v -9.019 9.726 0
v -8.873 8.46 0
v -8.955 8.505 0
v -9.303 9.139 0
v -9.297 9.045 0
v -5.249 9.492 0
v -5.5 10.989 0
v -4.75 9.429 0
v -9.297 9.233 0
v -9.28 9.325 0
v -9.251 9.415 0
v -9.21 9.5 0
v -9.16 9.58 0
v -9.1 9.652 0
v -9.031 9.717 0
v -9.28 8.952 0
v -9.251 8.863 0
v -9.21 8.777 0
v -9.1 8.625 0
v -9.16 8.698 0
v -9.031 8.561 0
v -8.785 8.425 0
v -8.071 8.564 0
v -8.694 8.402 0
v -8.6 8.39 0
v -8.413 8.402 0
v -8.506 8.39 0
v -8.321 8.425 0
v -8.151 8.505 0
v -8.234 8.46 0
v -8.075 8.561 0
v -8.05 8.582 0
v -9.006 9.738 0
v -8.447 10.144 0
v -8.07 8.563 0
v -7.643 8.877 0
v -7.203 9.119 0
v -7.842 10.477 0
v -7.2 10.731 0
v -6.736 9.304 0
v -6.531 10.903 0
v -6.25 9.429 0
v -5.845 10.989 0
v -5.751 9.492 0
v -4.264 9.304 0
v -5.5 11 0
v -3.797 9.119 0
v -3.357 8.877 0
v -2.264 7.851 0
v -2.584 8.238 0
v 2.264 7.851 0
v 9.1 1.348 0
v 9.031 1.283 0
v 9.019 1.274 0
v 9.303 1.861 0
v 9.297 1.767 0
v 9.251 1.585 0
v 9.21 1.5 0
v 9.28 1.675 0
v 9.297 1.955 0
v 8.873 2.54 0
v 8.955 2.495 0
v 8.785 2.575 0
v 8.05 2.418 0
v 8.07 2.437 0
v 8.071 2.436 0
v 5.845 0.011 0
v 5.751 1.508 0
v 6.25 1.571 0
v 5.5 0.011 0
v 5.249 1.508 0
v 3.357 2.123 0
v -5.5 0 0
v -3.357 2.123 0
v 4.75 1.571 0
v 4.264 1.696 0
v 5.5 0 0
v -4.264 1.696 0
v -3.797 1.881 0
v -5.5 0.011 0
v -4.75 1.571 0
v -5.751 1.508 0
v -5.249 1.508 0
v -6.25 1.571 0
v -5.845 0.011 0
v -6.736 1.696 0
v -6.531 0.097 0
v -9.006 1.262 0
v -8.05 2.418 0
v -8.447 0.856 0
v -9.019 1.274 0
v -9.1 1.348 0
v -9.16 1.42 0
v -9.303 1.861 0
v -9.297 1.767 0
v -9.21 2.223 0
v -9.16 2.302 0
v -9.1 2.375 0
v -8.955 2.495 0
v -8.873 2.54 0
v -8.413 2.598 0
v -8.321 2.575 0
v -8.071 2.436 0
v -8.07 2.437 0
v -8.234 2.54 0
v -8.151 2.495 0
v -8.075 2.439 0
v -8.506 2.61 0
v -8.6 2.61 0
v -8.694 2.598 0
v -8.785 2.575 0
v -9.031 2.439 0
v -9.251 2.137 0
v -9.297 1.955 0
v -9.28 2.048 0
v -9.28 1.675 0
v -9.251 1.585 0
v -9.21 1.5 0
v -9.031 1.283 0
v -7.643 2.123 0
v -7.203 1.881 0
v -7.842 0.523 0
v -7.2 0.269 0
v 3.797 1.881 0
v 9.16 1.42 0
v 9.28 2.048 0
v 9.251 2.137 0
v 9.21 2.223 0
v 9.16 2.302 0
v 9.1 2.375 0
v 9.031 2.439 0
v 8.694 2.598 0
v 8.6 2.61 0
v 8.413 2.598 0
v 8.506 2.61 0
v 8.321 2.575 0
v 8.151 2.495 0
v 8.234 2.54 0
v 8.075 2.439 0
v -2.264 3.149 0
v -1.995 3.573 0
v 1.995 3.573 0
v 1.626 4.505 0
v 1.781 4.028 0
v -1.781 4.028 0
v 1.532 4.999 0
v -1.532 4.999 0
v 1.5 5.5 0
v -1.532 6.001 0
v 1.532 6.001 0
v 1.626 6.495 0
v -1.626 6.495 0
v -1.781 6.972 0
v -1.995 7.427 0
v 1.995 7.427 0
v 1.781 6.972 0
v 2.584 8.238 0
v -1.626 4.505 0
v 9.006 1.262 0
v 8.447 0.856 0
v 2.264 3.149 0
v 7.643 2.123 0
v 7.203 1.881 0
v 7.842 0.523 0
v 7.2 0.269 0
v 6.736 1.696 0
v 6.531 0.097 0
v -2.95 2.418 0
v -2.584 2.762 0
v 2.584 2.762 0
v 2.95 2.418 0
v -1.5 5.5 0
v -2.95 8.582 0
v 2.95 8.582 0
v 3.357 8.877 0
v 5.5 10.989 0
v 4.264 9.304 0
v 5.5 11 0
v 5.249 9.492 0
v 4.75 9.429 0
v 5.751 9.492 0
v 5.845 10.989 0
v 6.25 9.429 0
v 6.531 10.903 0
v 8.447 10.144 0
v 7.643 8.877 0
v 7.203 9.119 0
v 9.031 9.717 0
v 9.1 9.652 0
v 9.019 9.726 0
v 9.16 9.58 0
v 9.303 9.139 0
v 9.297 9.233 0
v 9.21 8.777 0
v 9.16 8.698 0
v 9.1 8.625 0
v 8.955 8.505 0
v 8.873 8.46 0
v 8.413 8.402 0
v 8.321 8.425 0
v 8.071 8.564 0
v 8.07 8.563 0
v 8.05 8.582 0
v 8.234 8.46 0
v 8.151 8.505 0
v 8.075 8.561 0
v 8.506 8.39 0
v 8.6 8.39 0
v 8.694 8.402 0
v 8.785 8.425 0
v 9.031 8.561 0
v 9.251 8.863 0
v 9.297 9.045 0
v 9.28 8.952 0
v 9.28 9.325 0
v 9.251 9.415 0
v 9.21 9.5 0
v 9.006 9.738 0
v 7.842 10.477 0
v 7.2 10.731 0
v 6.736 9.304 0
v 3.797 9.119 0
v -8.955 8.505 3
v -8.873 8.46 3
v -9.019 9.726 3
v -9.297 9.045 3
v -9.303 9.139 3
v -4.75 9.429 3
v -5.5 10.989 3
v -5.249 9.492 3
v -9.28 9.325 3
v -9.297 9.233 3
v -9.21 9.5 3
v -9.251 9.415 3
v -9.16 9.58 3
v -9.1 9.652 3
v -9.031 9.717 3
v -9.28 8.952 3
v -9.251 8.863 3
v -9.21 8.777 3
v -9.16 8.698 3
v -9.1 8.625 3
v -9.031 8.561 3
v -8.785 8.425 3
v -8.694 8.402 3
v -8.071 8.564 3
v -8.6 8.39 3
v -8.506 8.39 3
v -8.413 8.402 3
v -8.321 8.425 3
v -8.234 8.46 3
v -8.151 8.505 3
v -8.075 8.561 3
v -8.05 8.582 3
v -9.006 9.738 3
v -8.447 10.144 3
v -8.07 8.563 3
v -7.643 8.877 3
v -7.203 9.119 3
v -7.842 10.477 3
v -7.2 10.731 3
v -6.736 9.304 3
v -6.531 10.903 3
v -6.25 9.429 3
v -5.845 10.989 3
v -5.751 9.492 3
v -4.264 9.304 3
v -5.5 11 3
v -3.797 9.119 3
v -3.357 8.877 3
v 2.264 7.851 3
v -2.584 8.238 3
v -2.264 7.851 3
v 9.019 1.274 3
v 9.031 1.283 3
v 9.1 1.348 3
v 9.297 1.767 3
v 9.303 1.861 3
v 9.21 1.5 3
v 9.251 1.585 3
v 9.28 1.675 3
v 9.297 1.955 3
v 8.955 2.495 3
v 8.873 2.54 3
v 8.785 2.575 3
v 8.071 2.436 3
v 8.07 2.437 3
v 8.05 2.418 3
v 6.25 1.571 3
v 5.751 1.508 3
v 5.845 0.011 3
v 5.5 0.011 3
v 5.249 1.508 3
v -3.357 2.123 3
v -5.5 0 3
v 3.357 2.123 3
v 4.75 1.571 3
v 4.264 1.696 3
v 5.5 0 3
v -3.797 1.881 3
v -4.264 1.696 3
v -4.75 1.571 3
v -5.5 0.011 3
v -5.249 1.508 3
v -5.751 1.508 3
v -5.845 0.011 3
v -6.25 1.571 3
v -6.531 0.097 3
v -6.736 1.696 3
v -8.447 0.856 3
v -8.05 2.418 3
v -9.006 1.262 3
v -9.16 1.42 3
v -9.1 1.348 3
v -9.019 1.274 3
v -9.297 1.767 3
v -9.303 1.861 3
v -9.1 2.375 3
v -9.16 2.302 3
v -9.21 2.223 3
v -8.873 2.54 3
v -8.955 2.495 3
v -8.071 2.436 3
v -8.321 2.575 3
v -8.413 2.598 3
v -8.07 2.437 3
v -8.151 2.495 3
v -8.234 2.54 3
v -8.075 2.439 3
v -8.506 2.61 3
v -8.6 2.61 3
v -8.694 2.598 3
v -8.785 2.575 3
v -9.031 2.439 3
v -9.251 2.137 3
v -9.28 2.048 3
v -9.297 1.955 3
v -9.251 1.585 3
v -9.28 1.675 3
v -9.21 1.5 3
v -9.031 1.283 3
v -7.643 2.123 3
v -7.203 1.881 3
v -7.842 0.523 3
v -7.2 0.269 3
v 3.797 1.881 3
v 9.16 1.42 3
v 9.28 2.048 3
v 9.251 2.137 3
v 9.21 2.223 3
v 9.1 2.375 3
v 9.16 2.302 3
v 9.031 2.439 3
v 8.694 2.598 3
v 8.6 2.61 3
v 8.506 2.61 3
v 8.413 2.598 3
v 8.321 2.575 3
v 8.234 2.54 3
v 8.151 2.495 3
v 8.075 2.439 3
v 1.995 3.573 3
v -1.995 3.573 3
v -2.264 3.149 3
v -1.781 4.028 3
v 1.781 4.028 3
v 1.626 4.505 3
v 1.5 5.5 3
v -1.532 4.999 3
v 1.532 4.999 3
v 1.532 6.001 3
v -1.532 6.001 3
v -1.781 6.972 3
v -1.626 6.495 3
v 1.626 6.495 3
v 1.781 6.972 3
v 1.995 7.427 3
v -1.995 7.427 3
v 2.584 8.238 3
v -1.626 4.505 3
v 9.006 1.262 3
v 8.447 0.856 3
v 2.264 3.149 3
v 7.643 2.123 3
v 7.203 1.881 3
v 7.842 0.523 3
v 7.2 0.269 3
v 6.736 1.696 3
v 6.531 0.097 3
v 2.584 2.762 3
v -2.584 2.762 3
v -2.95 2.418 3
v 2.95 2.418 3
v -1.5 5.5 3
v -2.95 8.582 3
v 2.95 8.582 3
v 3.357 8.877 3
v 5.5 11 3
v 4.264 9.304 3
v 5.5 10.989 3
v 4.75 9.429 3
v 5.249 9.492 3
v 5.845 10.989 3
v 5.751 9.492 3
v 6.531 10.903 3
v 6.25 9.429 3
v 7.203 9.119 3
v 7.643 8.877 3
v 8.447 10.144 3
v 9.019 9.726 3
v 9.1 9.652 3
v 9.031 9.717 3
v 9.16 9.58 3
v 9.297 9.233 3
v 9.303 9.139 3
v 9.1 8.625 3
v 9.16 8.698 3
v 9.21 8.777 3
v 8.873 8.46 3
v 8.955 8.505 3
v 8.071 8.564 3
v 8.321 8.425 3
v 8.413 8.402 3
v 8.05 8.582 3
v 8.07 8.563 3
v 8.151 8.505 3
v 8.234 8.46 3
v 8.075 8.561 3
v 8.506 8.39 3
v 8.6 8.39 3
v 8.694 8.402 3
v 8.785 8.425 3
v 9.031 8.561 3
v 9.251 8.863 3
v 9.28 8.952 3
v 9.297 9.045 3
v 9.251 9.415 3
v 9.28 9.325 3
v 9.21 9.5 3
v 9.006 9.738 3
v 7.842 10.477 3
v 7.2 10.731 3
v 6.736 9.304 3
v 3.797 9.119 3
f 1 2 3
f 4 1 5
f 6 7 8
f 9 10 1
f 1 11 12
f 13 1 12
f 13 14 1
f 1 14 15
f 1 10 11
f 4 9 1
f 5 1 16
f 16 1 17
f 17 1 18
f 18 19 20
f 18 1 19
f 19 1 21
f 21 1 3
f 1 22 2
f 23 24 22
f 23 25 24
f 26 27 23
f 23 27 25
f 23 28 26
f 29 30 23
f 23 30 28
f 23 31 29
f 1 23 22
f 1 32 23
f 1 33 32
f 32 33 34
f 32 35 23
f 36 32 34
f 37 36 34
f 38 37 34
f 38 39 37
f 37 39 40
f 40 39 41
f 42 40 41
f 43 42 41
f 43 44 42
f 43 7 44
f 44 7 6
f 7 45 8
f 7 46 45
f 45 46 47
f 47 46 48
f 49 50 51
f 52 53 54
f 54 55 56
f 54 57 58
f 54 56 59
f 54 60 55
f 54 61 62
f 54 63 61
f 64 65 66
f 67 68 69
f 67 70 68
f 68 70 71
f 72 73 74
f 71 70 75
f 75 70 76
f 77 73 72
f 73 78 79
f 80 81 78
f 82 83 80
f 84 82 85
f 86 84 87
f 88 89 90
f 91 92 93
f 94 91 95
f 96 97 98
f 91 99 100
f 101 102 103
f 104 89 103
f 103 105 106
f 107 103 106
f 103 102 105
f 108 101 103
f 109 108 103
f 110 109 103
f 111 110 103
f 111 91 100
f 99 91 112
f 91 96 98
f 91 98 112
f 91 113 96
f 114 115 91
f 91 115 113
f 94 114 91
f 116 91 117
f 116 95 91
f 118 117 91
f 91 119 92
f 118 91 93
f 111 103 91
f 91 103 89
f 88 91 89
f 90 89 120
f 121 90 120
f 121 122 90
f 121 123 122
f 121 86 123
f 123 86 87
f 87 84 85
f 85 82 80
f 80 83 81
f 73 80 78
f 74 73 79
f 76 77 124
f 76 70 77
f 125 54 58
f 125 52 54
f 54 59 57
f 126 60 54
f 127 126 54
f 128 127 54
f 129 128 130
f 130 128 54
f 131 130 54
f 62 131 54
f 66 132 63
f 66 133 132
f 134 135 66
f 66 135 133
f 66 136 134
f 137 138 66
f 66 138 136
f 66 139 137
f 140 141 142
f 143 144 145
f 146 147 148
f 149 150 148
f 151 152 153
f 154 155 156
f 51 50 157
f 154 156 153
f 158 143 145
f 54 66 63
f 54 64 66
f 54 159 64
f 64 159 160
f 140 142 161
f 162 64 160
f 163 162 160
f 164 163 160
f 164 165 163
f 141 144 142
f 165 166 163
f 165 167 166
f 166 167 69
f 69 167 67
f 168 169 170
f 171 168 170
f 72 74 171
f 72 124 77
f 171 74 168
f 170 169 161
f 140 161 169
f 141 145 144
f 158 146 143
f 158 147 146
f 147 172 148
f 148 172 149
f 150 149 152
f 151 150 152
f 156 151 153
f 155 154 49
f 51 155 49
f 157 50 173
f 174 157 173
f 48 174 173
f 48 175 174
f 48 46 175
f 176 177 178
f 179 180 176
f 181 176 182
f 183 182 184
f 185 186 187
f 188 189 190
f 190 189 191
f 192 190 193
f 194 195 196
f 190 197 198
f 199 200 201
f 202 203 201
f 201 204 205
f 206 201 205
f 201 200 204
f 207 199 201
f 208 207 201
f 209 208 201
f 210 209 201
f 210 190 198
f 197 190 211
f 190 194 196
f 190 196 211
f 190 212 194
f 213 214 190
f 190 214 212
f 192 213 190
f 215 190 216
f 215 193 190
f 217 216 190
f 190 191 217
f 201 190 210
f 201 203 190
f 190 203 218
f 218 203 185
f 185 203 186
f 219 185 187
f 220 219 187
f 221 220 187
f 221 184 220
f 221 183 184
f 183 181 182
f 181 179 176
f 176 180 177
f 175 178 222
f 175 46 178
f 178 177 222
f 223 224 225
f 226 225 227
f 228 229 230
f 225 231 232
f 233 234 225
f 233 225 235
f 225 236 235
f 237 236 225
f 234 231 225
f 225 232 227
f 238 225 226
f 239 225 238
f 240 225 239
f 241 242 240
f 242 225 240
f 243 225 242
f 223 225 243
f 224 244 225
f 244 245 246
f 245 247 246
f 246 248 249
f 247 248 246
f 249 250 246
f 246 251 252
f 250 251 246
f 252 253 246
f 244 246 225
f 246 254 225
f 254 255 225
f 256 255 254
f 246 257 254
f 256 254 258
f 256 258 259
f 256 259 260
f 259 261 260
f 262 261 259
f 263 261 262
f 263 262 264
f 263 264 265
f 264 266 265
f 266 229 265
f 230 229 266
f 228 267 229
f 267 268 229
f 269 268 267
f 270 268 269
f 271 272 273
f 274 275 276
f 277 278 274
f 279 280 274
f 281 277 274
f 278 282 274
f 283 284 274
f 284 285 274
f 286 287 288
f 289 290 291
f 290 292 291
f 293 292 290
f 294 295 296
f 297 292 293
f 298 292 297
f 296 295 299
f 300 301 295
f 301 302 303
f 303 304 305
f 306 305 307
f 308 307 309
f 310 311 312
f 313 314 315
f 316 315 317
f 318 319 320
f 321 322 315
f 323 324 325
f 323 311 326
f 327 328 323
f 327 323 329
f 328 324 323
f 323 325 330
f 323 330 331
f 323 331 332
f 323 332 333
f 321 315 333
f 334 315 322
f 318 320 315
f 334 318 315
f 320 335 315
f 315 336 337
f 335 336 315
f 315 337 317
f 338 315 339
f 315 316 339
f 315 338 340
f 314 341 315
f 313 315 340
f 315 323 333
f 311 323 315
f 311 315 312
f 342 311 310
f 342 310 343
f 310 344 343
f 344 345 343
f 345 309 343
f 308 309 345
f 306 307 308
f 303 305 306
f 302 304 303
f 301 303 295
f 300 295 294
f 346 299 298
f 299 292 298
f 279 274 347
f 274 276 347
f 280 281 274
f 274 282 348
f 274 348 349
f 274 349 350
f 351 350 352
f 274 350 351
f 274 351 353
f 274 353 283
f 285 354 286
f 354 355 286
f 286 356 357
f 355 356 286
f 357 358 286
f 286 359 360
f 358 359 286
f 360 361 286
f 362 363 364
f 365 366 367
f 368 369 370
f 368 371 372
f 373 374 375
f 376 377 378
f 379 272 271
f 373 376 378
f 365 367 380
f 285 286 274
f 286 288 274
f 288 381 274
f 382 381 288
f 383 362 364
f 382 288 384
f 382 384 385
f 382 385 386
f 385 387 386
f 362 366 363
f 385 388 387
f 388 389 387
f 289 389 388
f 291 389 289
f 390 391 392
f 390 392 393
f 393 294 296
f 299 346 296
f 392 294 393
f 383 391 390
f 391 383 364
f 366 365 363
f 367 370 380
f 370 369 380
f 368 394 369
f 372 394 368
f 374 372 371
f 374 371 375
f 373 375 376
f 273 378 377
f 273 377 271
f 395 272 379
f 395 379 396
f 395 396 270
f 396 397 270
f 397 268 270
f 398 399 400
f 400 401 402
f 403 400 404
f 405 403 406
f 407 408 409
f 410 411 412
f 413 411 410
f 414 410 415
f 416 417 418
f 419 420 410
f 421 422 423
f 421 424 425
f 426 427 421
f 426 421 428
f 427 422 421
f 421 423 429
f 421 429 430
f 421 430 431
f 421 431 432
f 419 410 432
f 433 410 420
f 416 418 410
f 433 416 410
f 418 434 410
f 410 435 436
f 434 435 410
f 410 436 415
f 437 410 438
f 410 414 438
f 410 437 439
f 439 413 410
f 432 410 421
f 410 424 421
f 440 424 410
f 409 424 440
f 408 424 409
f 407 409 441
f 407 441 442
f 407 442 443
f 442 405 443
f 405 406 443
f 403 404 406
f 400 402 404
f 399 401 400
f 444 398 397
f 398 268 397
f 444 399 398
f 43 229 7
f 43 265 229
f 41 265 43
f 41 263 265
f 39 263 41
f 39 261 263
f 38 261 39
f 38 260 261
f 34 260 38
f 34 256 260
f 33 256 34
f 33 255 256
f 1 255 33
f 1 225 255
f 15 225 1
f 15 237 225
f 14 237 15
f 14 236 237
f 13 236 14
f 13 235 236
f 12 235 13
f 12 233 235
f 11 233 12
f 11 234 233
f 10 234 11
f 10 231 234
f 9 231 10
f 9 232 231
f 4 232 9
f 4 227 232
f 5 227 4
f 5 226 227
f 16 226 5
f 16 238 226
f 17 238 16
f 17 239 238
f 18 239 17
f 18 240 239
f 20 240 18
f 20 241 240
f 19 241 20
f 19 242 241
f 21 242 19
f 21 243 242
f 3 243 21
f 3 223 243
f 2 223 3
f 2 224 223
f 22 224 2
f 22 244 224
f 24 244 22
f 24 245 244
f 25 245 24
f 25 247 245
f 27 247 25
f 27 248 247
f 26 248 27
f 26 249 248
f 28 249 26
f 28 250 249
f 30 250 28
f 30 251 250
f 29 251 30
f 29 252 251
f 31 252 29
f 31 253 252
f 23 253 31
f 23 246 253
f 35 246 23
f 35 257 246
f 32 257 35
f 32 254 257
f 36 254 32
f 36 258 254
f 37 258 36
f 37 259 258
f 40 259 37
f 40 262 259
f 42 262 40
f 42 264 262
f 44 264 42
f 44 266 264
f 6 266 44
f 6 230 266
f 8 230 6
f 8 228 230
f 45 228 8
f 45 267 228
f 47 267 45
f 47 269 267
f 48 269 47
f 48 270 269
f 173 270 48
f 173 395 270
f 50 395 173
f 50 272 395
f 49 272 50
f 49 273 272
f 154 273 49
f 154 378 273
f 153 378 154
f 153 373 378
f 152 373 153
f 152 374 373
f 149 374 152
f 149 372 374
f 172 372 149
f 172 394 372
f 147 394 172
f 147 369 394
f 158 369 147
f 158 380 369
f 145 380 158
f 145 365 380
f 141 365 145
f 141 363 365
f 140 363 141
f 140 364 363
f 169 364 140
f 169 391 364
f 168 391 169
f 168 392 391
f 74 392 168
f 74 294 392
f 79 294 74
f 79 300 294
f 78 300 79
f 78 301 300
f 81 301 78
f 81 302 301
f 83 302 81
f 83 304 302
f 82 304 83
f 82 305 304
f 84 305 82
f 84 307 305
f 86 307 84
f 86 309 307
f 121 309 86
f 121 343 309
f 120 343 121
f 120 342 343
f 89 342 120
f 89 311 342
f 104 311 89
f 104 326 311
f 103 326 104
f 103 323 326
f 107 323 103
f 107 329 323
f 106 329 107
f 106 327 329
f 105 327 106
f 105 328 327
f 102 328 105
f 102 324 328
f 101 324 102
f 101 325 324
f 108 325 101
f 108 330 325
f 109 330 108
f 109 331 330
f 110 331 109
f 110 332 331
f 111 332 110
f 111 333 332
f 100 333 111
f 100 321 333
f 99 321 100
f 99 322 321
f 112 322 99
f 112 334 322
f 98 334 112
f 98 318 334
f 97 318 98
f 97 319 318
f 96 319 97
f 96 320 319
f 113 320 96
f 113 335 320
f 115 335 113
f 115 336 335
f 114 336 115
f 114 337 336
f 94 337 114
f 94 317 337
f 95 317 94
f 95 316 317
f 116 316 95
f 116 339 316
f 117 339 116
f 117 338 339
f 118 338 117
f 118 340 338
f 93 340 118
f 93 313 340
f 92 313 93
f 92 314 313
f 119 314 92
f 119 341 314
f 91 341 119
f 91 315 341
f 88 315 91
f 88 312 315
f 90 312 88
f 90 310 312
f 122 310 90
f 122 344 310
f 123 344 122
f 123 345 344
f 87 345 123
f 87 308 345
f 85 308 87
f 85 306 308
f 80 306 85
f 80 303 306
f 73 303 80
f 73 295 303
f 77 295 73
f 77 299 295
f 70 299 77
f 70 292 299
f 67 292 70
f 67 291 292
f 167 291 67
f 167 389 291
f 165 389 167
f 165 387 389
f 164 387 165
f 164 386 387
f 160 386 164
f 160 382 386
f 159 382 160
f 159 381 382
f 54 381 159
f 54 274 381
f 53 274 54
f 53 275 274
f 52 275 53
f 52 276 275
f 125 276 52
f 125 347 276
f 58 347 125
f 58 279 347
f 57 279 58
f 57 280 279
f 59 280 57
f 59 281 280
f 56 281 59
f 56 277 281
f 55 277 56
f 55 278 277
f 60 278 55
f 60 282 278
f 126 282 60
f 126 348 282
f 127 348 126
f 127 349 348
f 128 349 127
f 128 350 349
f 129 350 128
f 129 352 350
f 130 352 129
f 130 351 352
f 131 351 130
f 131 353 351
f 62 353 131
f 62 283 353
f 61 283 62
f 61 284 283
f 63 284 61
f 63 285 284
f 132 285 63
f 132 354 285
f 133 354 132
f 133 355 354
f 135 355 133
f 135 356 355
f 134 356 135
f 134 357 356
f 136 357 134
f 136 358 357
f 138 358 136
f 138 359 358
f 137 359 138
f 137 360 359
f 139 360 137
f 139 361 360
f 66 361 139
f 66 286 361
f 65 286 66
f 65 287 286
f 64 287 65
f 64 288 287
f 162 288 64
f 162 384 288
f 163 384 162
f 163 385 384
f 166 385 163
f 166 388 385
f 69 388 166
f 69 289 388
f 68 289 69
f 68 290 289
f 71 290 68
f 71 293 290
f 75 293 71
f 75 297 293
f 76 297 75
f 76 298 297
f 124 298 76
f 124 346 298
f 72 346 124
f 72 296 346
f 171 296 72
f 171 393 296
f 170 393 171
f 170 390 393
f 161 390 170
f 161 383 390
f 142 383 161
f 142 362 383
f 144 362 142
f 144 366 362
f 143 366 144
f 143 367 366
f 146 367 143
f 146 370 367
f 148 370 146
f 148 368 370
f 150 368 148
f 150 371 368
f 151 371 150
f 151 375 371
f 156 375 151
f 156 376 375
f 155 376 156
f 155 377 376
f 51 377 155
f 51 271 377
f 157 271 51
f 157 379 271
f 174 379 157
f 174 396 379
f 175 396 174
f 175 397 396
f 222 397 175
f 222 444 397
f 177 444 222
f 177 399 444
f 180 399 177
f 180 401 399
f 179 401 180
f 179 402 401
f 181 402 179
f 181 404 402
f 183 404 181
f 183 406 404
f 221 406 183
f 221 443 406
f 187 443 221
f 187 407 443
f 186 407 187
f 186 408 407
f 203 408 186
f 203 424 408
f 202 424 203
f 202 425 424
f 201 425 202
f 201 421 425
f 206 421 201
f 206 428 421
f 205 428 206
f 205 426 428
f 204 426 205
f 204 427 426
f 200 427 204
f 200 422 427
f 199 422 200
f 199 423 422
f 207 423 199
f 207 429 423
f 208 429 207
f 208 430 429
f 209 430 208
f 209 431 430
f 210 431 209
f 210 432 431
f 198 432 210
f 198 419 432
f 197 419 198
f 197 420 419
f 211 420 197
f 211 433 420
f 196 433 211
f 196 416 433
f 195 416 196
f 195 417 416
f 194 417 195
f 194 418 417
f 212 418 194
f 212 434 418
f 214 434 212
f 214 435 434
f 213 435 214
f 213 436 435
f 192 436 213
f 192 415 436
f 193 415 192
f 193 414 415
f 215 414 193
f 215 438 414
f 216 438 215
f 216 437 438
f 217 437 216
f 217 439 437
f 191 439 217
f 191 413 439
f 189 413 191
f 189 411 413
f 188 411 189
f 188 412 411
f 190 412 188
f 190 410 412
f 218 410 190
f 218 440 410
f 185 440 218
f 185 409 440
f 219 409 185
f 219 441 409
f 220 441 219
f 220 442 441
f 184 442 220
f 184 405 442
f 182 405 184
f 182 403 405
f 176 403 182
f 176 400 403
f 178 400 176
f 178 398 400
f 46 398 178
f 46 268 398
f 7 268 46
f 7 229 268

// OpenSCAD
// cable diameter
cable = 8;
// number of cable pairs for holder
rows = 1;
// wall thikness */
thik  = 1.5;
// size of opening for cable
angel = 50; // [90]

/*******************************************************************************/
/* [Hidden] */
$fn=50;

outer = cable + 2*thik;
clips(rows);

/* rows of dual clips */
module clips(num) {
    linear_extrude(height=3) {
	for(idx=[0 : 1 : num-1  ]) {
	    translate([0, outer * idx])
	    dual();
	}
    }
}

/* dual clip, centred */
module dual() {
    copy_mirror()
    translate([outer/2, outer/2])
    clip(cable, outer, angel);
}

/* single clip, centered */
module clip(cable, outer, angel) {
    difference() {
	union() {
	    /* fill in the middle */
	    translate([-outer/2,0])
	    square(outer/2);
	    translate([-outer/2,-outer/2])
	    square(outer/2);

	    /* outer circle */
	    circle(d=outer);
	}
	/* remove cable circle */
	circle(d=cable);
	polygon(points=[[0,0],[ outer/2, tan(angel)*outer/2],[outer/2,-tan(angel)*outer/2]]);
    }
    /* Add rouded edge */
    hyp = ((outer-cable)/2 + cable)/2;

    translate([ cos(angel)*hyp , sin(angel)*hyp])
    circle(d=(outer-cable)/2);
    translate([ cos(angel)*hyp , -sin(angel)*hyp])
    circle(d=(outer-cable)/2);
}


/******************************************************************************/
/* generic helpers */

module copy_mirror(vec=[1,0,0]) {
    children();
    mirror(vec) children();
}
